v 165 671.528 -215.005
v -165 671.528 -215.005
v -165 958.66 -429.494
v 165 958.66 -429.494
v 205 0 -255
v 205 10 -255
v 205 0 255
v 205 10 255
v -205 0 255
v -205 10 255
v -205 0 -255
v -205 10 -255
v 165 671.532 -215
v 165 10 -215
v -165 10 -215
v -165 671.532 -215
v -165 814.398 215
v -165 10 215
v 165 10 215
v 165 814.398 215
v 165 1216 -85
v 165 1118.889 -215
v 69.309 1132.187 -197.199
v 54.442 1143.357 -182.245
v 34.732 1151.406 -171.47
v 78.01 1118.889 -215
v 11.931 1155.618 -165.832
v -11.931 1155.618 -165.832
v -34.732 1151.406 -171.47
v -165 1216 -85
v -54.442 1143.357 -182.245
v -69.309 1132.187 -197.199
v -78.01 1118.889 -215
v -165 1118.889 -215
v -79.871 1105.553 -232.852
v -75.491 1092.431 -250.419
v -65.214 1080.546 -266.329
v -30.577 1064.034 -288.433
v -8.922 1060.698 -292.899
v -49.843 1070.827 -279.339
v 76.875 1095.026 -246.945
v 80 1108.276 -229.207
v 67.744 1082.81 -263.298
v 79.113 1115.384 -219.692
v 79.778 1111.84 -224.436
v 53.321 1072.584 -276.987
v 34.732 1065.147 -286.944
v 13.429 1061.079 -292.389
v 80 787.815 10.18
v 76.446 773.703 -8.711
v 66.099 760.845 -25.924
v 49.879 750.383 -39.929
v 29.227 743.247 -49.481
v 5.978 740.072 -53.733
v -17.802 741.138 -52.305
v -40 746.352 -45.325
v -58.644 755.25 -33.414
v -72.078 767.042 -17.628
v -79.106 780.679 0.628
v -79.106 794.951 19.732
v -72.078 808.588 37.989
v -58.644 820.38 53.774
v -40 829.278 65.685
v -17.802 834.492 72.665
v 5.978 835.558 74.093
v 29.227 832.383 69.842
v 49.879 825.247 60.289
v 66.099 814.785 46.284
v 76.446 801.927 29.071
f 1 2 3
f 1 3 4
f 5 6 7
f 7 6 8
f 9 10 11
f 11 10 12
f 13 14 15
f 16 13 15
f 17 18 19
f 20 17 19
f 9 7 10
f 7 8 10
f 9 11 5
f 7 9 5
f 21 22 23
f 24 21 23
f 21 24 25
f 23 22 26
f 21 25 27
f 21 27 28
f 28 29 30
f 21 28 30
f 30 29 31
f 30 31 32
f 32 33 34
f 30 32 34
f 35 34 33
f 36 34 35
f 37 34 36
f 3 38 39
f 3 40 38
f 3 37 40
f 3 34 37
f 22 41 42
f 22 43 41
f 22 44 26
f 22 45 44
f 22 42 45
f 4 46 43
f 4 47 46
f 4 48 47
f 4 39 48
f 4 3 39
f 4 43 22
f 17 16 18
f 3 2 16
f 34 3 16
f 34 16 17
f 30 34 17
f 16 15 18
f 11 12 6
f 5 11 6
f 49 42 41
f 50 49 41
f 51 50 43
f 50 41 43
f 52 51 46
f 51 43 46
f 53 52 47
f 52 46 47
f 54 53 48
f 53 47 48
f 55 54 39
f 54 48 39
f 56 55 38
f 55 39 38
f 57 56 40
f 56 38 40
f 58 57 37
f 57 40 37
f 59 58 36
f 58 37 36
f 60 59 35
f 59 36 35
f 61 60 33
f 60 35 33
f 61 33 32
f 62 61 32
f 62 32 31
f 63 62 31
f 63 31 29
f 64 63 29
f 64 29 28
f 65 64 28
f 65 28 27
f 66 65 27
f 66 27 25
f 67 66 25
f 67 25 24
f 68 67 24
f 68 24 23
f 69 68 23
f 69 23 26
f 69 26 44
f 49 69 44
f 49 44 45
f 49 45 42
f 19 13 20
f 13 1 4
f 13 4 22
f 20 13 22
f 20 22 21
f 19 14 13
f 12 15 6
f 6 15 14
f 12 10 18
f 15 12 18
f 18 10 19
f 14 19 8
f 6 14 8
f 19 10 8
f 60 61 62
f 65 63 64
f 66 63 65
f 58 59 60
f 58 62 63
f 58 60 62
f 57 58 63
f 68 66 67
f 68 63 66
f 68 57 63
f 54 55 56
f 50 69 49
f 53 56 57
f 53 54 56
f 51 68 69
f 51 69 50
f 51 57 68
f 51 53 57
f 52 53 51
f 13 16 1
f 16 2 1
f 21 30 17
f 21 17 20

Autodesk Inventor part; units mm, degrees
ref_plane "YZ Plane" through (0, 0, 0) normal (1, 0, 0) x (0, 1, 0)
ref_plane "XZ Plane" through (0, 0, 0) normal (0, 1, 0) x (-1, 0, 0)
sketch "Sketch1" plane through (0, 0, 0) normal (0, 1, 0) x (-1, 0, 0)
  line L0 (165, 215) -> (-165, 215)
  line L1 (-165, 215) -> (-165, -215)
  line L2 (-165, -215) -> (165, -215)
  line L3 (165, -215) -> (165, 215)
  line L4 (165, 215) -> (-165, -215) construction
  line L5 (-165, 215) -> (165, -215) construction
  point P0 (0, 0)
  dimension "d0" = 330
  dimension "d1" = 430
extrude "Extrusion1" add sketch "Sketch1" along normal blind 816
move faces "Move1" translate (0, 400, 0) faces at (55, 816, 71.6667)
chamfer "Chamfer1" distance 300 angle 53.24 1 edges at (0, 1216, 215) measured on face at (55, 1216, 71.6667)
chamfer "Chamfer2" distance 130 angle 36.76 1 edges at (0, 1216, -215) measured on face at (55, 1216, -171.6667)
ref_plane "Work Plane1" through (165, 1216, -85) normal (0, 0.8011494, -0.5984644) x (1, 0, 0)
sketch "Sketch2" plane through (165, 1216, -85) normal (0, 0.8011494, -0.5984644) x (1, 0, 0)
  line L0 (-330, 0) -> (0, 0) projected
  line L1 (-330, 487.3879) -> (-330, 0) projected
  line L2 (0, 0) -> (-330, 0)
  line L3 (-330, 0) -> (-330, 430)
  line L4 (-330, 430) -> (0, 430)
  line L5 (0, 430) -> (0, 0)
  point P0 (-165, 659.6351)
extrude "Extrusion2" add sketch "Sketch2" against normal blind 358.4
sketch "Sketch3" plane through (-165, 1216, -85) normal (0, 0.8011494, -0.5984644) x (1, 0, 0)
  circle A0 centre (165, 180) radius 80
  point P0 (165, 659.6351)
extrude "Extrusion3" cut sketch "Sketch3" against normal blind 400
sketch "Sketch4" plane through (0, 0, 0) normal (0, -1, 0) x (1, 0, 0)
  line L0 (165, 215) -> (-165, 215)
  line L1 (-165, 215) -> (-165, -215)
  line L2 (-165, -215) -> (165, -215)
  line L3 (165, -215) -> (165, 215)
  line L4 (165, 215) -> (-165, -215) construction
  line L5 (-165, 215) -> (165, -215) construction
  point P0 (0, 0)
extrude "Extrusion4" cut sketch "Sketch4" against normal blind 10
sketch "Sketch5" plane through (0, 10, 0) normal (0, -1, 0) x (1, 0, 0)
  line L0 (205, 255) -> (-205, 255)
  line L1 (-205, 255) -> (-205, -255)
  line L2 (-205, -255) -> (205, -255)
  line L3 (205, -255) -> (205, 255)
  line L4 (205, 255) -> (-205, -255) construction
  line L5 (-205, 255) -> (205, -255) construction
  point P0 (0, 0)
extrude "Extrusion5" add sketch "Sketch5" along normal blind 10
properties part number "MountBase"
